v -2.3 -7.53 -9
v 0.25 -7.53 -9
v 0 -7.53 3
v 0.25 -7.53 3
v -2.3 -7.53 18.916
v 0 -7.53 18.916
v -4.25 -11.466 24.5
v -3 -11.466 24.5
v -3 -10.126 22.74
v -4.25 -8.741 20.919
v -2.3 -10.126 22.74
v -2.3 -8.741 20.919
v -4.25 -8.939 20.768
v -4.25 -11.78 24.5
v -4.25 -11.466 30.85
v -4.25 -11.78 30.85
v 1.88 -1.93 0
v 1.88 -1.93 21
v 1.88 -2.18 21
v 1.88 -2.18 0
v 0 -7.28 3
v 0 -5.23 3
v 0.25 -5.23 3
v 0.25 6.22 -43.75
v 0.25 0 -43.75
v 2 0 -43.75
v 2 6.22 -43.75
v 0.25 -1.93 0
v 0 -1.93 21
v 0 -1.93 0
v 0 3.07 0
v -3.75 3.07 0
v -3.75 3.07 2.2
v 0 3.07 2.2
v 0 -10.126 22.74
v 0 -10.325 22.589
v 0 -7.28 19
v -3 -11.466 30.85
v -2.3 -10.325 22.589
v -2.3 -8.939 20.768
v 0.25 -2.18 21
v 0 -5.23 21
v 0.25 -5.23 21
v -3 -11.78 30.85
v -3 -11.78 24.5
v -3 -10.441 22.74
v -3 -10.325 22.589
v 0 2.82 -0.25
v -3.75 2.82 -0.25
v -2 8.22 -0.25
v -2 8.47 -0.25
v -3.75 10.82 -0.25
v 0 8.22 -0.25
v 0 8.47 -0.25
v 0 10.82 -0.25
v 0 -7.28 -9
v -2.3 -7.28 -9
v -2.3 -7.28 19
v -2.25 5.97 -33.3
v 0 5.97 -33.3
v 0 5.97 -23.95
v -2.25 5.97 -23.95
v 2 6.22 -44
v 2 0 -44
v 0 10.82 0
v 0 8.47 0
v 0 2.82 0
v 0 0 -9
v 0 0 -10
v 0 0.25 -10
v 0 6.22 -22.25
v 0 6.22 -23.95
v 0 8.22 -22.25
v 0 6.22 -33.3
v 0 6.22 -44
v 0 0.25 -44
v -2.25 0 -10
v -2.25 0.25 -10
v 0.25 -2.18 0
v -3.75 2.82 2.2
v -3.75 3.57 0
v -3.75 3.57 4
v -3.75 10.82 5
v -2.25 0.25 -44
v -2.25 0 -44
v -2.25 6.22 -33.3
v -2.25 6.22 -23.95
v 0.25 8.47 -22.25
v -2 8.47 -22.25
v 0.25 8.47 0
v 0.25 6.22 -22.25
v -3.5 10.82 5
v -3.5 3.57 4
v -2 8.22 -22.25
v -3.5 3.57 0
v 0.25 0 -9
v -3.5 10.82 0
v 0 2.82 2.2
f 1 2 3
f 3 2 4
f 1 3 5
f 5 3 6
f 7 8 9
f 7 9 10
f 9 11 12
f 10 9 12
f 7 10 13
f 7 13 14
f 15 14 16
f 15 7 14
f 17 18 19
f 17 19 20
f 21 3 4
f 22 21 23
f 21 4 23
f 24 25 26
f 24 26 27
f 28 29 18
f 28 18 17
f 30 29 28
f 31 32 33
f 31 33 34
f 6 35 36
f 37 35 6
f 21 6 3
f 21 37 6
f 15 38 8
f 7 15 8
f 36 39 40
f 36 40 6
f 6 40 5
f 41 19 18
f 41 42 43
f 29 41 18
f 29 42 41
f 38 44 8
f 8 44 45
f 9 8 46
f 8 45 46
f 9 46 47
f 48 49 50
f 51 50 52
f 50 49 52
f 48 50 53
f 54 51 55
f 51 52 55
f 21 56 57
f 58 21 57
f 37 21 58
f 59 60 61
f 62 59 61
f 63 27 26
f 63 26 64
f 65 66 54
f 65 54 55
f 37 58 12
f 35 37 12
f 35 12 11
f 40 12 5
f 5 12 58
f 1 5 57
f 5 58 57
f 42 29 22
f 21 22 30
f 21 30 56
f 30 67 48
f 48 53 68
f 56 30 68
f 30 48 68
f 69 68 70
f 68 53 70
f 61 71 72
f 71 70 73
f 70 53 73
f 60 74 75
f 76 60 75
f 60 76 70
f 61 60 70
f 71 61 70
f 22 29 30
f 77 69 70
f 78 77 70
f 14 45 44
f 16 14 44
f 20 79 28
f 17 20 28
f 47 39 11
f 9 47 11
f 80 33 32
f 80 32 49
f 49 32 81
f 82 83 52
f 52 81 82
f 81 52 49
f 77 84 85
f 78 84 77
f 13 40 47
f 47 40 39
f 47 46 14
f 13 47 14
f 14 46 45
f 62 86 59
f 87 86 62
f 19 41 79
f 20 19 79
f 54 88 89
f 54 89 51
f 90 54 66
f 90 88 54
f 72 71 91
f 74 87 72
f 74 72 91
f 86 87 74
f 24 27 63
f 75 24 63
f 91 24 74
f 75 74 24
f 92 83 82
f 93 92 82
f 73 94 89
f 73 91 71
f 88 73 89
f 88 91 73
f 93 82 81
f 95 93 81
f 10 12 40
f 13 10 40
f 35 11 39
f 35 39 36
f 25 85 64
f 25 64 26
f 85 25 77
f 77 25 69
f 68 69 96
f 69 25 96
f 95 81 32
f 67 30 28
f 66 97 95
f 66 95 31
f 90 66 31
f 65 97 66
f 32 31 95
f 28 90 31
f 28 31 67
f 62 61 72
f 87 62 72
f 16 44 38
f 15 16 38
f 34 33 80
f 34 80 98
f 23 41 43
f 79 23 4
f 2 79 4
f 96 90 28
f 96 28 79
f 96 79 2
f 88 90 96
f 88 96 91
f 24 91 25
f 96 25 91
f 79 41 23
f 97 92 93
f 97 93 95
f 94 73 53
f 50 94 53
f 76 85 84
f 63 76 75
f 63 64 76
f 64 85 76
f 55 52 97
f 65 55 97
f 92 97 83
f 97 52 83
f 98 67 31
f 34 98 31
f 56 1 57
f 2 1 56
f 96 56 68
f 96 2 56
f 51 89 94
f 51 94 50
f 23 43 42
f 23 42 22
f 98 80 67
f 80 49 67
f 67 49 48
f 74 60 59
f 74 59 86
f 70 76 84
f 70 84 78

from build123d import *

# Parameters (mm, degrees)
SKETCH_1_W               = 44
SKETCH_1_H               = 6.22
EXTRUDE_1_DEPTH          = 0.25
SKETCH_2_W               = 0.25
SKETCH_2_H               = 6.22
EXTRUDE_2_DEPTH          = 1.75
SKETCH_4_W               = 34
SKETCH_4_H               = 0.25
SKETCH_4_W_2             = 9.35
EXTRUDE_3_DEPTH          = 2.25
SKETCH_5_W               = 22.25
SKETCH_5_H               = 2.25
SKETCH_5_W_2             = 9
SKETCH_5_H_2             = 7.53
EXTRUDE_4_DEPTH          = 0.25
SKETCH_6_W               = 21
SKETCH_6_H               = 5.6
EXTRUDE_5_DEPTH          = 0.25
SKETCH_7_W               = 18
SKETCH_7_H               = 2.3
CUT_EXTRUDE_1_DEPTH      = 45.877509958
SKETCH_8_W               = 21
SKETCH_8_H               = 0.25
EXTRUDE_6_DEPTH          = 1.63
SKETCH_9_W               = 28
SKETCH_9_H               = 0.25
EXTRUDE_7_DEPTH          = 2.3
EXTRUDE_8_DEPTH          = 2.3
EXTRUDE_9_DEPTH          = 1.95
SKETCH_12_W              = 2.3
SKETCH_12_H              = 2.401936356
CUT_EXTRUDE_2_DEPTH      = 51.369645687
CUT_EXTRUDE_3_DEPTH      = 49.492266831
CUT_EXTRUDE_3_DEPTH_BACK = 49.492266831
SKETCH_13_W              = 0.7
SKETCH_13_H              = 8.10994941
CUT_EXTRUDE_4_DEPTH      = 0.7
SKETCH_15_W              = 22.25
SKETCH_15_H              = 0.25
EXTRUDE_10_DEPTH         = 2
EXTRUDE_11_DEPTH         = 0.25
CUT_EXTRUDE_5_REACH      = 48.336
SKETCH_17_W              = 4.75
SKETCH_17_H              = 8
SKETCH_18_W              = 3.75
SKETCH_18_H              = 0.25
EXTRUDE_12_DEPTH         = 2.2
EXTRUDE_13_DEPTH         = 0.25


with BuildPart() as part:
    # 草图1 → 凸台-拉伸1 (new body)
    with BuildSketch(Plane(origin=(0, 0, 0), x_dir=(0, 0, -1), z_dir=(1, 0, 0))):
        with Locations((22, 3.11)):
            Rectangle(SKETCH_1_W, SKETCH_1_H)
    extrude(amount=EXTRUDE_1_DEPTH)

    # 草图2 → 凸台-拉伸2 (add)
    with BuildSketch(Plane(origin=(0.25, 0, 0), x_dir=(0, 0, -1), z_dir=(1, 0, 0))):
        with Locations((43.875, 3.11)):
            Rectangle(SKETCH_2_W, SKETCH_2_H)
    extrude(amount=EXTRUDE_2_DEPTH)

    # 草图4 → 凸台-拉伸3 (add)
    with BuildSketch(Plane.ZY):
        with Locations((-27, 0.125)):
            Rectangle(SKETCH_4_W, SKETCH_4_H)
        with Locations((-28.625, 6.095)):
            Rectangle(SKETCH_4_W_2, SKETCH_4_H)
    extrude(amount=EXTRUDE_3_DEPTH)

    # 草图5 → 凸台-拉伸4 (add)
    with BuildSketch(Plane(origin=(0.25, 0, 0), x_dir=(0, 0, -1), z_dir=(1, 0, 0))):
        with Locations((11.125, 7.345)):
            Rectangle(SKETCH_5_W, SKETCH_5_H)
        with Locations((4.5, -3.765)):
            Rectangle(SKETCH_5_W_2, SKETCH_5_H_2)
    extrude(amount=-EXTRUDE_4_DEPTH)

    # 草图6 → 凸台-拉伸5 (add)
    with BuildSketch(Plane(origin=(0.25, 0, 0), x_dir=(0, 0, -1), z_dir=(1, 0, 0))):
        with Locations((-10.5, -4.73)):
            Rectangle(SKETCH_6_W, SKETCH_6_H)
    extrude(amount=-EXTRUDE_5_DEPTH)

    # 草图7 → 切除-拉伸1 (cut, through all)
    with BuildSketch(Plane(origin=(0.25, 0, 0), x_dir=(0, 0, -1), z_dir=(1, 0, 0))):
        with Locations((-12, -6.38)):
            Rectangle(SKETCH_7_W, SKETCH_7_H)
    extrude(amount=-CUT_EXTRUDE_1_DEPTH, mode=Mode.SUBTRACT)

    # 草图8 → 凸台-拉伸6 (add)
    with BuildSketch(Plane(origin=(0.25, 0, 0), x_dir=(0, 0, -1), z_dir=(1, 0, 0))):
        with Locations((-10.5, -2.055)):
            Rectangle(SKETCH_8_W, SKETCH_8_H)
    extrude(amount=EXTRUDE_6_DEPTH)

    # 草图9 → 凸台-拉伸7 (add)
    with BuildSketch(Plane.ZY):
        with Locations((5, -7.405)):
            Rectangle(SKETCH_9_W, SKETCH_9_H)
    extrude(amount=EXTRUDE_7_DEPTH)

    # 草图10 → 凸台-拉伸8 (add)
    with BuildSketch(Plane.ZY.offset(2.3)):
        Polygon((19, -7.28), (24.5, -11.465833127), (24.5, -11.78), (18.91568756, -7.53), (19, -7.53), align=None)
    extrude(amount=-EXTRUDE_8_DEPTH)

    # 草图11 → 凸台-拉伸9 (add)
    with BuildSketch(Plane.ZY.offset(2.3)):
        Polygon((24.5, -11.465833127), (20.919100499, -8.740551717), (20.767695976, -8.939490578), (24.5, -11.78), (30.85, -11.78), (30.85, -11.465833127), align=None)
    extrude(amount=EXTRUDE_9_DEPTH)

    # 草图12 → 切除-拉伸2 (cut, through all)
    with BuildSketch(Plane(origin=(0, 4.546663396, 3.460286229), x_dir=(1, 0, 0), z_dir=(0, 0.795755444677028, 0.6056180910993872))):
        with Locations((-1.15, -25.42922133)):
            Rectangle(SKETCH_12_W, SKETCH_12_H)
    extrude(amount=-CUT_EXTRUDE_2_DEPTH, mode=Mode.SUBTRACT)

    # 草图13 → 切除-拉伸3 (cut, two sides: drawn at the far end of the back side and taken through both)
    with BuildSketch(Plane(origin=(0, -11.465833127, 0), x_dir=(1, 0, 0), z_dir=(0, 1, 0)).offset(-CUT_EXTRUDE_3_DEPTH_BACK)):
        with Locations((-2.65, -26.795025295)):
            Rectangle(SKETCH_13_W, SKETCH_13_H)
    extrude(amount=CUT_EXTRUDE_3_DEPTH + CUT_EXTRUDE_3_DEPTH_BACK, mode=Mode.SUBTRACT)

    # 草图14 → 切除-拉伸4 (cut)
    with BuildSketch(Plane(origin=(-2.3, 0, 0), x_dir=(0, 0, -1), z_dir=(1, 0, 0))):
        Polygon((-22.74005059, -10.126405028), (-22.74005059, -10.440571902), (-22.588646067, -10.325343889), align=None)
    extrude(amount=-CUT_EXTRUDE_4_DEPTH, mode=Mode.SUBTRACT)

    # 草图15 → 凸台-拉伸10 (add)
    with BuildSketch(Plane.ZY):
        with Locations((-11.125, 8.345)):
            Rectangle(SKETCH_15_W, SKETCH_15_H)
    extrude(amount=EXTRUDE_10_DEPTH)

    # 草图16 → 凸台-拉伸11 (add)
    with BuildSketch(Plane.XY):
        Polygon((0, 2.82), (0, 8.22), (-2, 8.22), (-2, 8.47), (0, 8.47), (0, 10.82), (-8.5, 10.82), (-5, 2.82), align=None)
    extrude(amount=-EXTRUDE_11_DEPTH)

    # 草图17 → 切除-拉伸5 (cut, up to next)
    with BuildSketch(Plane.XY, mode=Mode.PRIVATE) as cut_extrude_5_sk1:
        with Locations((-6.125, 6.82)):
            Rectangle(SKETCH_17_W, SKETCH_17_H)
    cut_extrude_5_tool1 = extrude(cut_extrude_5_sk1.sketch, amount=-CUT_EXTRUDE_5_REACH, mode=Mode.PRIVATE) & part.part
    add(cut_extrude_5_tool1.solids().sort_by_distance((-6.125, 6.82, 0))[0], mode=Mode.SUBTRACT)

    # 草图18 → 凸台-拉伸12 (add)
    with BuildSketch(Plane.XY):
        with Locations((-1.875, 2.945)):
            Rectangle(SKETCH_18_W, SKETCH_18_H)
    extrude(amount=EXTRUDE_12_DEPTH)

    # 草图19 → 凸台-拉伸13 (add)
    with BuildSketch(Plane.ZY.offset(3.75)):
        Polygon((0, 10.82), (5, 10.82), (4, 3.57), (0, 3.57), align=None)
    extrude(amount=-EXTRUDE_13_DEPTH)


solid = part.part
